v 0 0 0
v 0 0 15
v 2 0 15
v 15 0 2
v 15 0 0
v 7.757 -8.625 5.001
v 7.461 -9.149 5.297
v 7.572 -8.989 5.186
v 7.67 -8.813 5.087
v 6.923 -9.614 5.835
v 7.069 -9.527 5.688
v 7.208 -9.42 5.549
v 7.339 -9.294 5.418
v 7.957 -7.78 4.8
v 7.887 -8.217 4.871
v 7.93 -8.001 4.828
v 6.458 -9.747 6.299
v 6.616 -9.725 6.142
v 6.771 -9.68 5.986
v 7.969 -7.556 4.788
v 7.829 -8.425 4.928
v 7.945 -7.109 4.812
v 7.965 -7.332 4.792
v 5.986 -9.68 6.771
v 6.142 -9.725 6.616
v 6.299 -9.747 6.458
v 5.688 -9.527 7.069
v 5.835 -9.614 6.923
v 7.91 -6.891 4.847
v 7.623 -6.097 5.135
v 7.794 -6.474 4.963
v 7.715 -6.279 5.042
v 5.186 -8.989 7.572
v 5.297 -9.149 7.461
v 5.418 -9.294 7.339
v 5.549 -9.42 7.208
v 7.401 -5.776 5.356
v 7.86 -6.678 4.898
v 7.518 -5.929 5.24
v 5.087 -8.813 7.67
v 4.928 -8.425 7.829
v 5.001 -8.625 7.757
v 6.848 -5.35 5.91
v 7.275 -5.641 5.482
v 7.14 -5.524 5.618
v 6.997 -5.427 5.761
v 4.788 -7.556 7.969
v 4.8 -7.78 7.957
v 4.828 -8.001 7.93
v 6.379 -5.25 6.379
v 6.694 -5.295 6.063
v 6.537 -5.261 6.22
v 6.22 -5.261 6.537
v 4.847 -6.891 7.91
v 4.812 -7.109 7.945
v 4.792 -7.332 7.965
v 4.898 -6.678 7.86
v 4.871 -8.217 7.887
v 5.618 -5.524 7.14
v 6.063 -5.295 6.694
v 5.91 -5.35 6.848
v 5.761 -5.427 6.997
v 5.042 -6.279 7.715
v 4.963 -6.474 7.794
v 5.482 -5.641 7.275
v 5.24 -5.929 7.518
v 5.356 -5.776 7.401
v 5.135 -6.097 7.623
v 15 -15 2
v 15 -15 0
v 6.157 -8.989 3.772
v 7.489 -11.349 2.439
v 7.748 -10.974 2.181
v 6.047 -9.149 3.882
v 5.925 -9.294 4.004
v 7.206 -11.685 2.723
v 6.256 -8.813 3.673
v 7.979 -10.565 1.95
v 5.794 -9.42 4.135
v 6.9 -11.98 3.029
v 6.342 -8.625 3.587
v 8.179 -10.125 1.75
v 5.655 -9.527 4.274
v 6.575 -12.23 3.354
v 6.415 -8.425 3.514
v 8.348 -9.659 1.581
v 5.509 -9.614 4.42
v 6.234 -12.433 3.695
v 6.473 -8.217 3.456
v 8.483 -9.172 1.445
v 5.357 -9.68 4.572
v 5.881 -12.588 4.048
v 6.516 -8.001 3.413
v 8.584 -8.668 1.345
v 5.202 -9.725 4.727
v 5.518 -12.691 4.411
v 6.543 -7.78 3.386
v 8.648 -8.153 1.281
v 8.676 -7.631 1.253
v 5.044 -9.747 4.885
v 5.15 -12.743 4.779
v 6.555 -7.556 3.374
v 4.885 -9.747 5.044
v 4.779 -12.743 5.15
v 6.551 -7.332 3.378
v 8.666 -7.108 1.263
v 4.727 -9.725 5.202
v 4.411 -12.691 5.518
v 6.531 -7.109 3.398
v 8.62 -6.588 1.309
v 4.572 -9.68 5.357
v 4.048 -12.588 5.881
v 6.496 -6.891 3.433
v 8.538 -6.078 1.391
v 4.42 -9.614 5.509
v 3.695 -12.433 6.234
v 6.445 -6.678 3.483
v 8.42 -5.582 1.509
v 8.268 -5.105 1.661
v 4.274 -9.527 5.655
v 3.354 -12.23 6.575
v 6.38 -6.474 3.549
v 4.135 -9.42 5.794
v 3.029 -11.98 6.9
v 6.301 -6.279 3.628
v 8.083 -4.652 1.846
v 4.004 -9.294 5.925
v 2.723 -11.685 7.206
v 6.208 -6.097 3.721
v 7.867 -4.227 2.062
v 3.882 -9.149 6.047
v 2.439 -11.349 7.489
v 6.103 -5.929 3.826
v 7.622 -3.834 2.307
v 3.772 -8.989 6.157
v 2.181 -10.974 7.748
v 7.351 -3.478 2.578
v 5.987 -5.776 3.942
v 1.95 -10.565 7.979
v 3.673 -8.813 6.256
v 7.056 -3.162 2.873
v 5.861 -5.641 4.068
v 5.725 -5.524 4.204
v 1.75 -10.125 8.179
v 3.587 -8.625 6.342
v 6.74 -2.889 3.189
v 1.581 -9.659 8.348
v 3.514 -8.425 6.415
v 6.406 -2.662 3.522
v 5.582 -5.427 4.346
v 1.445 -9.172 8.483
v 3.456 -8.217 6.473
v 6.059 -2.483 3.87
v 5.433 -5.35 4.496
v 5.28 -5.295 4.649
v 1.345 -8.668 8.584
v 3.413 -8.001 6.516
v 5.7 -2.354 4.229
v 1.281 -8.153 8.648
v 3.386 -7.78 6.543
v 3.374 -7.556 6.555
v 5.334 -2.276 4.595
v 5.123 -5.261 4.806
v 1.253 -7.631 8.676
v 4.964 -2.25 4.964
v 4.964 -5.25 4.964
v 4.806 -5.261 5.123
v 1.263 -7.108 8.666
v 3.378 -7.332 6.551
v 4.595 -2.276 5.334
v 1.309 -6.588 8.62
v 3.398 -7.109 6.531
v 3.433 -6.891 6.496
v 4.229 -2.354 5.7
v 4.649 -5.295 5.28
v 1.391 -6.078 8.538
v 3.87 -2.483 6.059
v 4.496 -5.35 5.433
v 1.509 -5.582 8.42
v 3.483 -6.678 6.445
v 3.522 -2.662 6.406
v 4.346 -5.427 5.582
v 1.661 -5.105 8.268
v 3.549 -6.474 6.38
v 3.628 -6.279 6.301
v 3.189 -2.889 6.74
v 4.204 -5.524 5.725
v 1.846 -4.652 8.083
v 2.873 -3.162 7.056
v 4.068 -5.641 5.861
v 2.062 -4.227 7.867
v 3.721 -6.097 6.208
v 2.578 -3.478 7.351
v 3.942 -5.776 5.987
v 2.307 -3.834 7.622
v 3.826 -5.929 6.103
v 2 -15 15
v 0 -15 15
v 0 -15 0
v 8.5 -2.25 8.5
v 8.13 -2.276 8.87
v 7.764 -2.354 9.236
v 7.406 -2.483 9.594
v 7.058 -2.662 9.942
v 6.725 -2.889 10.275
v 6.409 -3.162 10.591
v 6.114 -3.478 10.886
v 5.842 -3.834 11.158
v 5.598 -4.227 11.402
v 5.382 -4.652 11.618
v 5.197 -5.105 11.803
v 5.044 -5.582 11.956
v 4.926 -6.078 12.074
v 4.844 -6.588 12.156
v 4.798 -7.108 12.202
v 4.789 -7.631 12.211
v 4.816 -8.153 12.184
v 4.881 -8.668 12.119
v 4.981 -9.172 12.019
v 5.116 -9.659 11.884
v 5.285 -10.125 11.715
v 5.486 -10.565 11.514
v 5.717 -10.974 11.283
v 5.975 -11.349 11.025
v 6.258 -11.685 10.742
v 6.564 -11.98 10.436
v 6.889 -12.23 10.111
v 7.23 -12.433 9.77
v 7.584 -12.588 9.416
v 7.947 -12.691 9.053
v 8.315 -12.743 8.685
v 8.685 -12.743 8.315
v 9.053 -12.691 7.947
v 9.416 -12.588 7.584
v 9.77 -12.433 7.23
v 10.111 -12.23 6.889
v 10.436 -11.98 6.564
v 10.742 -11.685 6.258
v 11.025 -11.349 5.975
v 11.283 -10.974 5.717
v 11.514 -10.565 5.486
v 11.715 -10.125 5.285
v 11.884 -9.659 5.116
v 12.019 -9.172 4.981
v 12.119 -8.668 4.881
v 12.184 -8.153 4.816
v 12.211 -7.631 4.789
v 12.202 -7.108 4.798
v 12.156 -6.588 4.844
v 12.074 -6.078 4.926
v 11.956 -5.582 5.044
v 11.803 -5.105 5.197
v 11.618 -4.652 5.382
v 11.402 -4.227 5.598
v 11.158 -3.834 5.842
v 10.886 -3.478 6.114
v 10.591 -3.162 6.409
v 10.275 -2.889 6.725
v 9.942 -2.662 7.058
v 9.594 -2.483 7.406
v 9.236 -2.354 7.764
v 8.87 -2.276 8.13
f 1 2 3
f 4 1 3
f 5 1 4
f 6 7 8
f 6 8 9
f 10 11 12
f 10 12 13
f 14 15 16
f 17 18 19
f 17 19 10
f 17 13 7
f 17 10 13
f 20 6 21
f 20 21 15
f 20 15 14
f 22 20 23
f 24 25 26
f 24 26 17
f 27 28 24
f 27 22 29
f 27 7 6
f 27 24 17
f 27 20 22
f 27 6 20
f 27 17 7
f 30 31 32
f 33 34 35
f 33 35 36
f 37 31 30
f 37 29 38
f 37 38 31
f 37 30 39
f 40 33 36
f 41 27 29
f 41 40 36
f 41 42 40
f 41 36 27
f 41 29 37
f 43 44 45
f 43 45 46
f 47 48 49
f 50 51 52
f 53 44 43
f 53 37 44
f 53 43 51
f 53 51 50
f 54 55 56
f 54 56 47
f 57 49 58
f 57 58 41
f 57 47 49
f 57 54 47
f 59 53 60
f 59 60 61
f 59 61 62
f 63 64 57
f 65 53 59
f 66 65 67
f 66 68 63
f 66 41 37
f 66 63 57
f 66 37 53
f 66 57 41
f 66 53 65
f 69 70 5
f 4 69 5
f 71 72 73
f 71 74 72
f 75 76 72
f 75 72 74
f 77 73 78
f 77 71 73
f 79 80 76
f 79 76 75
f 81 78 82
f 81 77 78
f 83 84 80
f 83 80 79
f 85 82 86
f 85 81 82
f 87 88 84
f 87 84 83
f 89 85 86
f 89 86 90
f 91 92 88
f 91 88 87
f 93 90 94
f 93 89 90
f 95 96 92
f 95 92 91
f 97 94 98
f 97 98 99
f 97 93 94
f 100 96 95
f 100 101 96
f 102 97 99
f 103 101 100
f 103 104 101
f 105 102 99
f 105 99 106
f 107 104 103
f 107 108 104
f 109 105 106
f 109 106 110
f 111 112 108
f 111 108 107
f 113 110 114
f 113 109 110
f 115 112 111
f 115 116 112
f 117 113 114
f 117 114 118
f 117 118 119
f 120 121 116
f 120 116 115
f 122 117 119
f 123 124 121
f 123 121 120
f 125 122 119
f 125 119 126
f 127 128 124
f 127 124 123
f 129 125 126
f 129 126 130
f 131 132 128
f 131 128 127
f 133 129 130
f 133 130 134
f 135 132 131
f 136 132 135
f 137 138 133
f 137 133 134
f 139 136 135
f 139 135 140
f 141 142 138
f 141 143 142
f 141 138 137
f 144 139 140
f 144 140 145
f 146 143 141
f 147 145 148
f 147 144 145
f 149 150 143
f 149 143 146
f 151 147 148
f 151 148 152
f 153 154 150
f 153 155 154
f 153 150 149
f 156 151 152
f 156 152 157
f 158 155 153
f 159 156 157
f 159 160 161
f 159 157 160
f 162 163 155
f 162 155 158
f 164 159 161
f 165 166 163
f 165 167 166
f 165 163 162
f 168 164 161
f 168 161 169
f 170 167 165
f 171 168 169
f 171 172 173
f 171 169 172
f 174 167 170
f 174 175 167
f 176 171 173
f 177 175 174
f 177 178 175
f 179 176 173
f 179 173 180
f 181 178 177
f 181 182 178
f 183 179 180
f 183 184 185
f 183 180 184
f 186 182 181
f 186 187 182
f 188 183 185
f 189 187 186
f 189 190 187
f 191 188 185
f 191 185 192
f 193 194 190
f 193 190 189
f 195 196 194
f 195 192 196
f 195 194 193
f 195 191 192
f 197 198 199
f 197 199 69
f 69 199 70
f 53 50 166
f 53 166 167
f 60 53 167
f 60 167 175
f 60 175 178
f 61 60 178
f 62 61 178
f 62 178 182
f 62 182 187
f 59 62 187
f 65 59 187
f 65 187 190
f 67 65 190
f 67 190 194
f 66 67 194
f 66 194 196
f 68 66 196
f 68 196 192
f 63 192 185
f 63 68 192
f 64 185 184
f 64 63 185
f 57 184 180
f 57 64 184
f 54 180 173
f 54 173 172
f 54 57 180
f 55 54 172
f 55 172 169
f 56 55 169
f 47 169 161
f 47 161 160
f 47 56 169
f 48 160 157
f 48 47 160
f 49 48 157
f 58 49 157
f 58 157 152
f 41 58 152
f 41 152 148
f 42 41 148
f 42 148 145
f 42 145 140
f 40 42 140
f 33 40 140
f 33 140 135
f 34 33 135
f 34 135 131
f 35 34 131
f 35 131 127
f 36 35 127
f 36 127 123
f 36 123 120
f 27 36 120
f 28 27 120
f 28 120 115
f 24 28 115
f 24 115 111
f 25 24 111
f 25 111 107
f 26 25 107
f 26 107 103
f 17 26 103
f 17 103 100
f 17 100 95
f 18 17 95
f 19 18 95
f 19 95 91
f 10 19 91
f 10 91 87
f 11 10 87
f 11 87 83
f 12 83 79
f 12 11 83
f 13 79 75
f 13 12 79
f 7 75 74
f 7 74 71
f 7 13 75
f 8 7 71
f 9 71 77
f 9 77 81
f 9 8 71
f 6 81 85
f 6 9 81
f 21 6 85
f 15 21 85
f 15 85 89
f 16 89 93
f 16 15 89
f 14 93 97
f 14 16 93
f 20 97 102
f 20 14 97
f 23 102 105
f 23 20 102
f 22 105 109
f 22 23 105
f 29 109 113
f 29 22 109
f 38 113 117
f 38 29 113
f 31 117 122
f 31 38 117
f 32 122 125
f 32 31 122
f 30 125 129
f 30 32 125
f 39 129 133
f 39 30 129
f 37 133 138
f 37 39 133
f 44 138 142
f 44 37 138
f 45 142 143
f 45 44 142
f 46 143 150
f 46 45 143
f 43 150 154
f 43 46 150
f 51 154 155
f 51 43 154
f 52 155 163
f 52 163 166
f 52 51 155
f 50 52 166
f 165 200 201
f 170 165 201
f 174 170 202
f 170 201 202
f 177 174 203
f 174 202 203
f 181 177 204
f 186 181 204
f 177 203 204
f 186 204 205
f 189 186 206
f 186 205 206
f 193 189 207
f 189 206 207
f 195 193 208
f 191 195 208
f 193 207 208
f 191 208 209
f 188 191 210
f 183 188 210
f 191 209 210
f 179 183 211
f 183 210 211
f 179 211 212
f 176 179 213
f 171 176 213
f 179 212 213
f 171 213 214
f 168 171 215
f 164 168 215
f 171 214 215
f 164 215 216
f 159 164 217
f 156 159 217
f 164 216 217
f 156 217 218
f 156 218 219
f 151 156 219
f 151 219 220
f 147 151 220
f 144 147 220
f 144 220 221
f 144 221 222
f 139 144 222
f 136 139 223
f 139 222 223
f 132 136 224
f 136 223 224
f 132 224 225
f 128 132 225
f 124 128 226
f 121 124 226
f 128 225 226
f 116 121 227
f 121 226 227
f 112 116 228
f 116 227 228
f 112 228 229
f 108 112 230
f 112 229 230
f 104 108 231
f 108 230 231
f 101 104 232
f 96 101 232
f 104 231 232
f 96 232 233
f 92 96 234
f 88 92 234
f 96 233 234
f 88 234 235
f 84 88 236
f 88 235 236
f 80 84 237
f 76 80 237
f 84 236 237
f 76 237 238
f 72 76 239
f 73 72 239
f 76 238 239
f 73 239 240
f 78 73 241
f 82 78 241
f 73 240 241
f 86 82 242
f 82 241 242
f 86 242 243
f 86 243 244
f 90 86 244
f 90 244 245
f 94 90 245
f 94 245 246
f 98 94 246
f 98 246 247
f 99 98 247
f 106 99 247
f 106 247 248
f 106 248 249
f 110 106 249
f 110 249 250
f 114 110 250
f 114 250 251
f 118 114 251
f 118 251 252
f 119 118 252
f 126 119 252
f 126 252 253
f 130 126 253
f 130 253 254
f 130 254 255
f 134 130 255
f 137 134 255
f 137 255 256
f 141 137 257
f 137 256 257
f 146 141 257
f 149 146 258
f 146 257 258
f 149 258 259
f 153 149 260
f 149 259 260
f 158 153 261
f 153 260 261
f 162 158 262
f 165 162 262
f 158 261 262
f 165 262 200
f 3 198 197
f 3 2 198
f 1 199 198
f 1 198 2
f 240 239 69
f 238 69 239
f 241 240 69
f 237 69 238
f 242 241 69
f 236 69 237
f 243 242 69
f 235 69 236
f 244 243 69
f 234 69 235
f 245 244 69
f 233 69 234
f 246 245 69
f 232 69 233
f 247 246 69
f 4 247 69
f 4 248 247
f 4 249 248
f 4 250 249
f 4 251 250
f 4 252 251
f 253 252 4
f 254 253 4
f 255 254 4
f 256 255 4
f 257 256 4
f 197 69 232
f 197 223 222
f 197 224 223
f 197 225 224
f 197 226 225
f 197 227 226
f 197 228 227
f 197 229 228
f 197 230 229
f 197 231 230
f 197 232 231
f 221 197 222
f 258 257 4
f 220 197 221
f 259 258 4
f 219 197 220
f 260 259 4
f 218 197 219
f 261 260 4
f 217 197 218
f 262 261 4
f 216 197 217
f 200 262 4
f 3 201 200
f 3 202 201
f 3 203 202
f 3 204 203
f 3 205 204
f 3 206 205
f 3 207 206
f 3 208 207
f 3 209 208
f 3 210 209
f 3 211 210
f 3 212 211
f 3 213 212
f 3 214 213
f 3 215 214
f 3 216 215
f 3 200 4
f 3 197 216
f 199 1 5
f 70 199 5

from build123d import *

# Parameters (mm, degrees)
F0_W     = 15
F0_H     = 15
F1_DEPTH = 15
F2_SIZE  = 13
F3_R     = 5.25
F3_R_2   = 2.25
F4_DEPTH = 5
F5_DEPTH = 3


with BuildPart() as f1:
    # F0 (on Top) → F1 (new body)
    with BuildSketch(Plane.XY):
        with Locations((7.5, -7.5)):
            Rectangle(F0_W, F0_H)
    extrude(amount=F1_DEPTH)

    # F2
    f2_edges = [f1.edges().sort_by_distance(p)[0] for p in [
        (15, -7.5, 15),
    ]]
    chamfer(f2_edges, length=F2_SIZE)

    # F3 (on face) → F4 (cut)
    with BuildSketch(Plane(origin=(8.5, 0, 8.5), x_dir=(0, 1, 0), z_dir=(0.7071067812, 0, 0.7071067812))):
        with Locations((-7.5, 0)):
            Circle(F3_R)
        with Locations((-7.5, 0)):
            Circle(F3_R_2, mode=Mode.SUBTRACT)
    extrude(amount=-F4_DEPTH, mode=Mode.SUBTRACT)

    # F5 (cut): a face of the model
    f5_faces = [f1.faces().sort_by_distance(p)[0] for p in [
        (8.5, -7.5, 8.5),
    ]]
    extrude(f5_faces, amount=-F5_DEPTH, mode=Mode.SUBTRACT)


solid = f1.part
